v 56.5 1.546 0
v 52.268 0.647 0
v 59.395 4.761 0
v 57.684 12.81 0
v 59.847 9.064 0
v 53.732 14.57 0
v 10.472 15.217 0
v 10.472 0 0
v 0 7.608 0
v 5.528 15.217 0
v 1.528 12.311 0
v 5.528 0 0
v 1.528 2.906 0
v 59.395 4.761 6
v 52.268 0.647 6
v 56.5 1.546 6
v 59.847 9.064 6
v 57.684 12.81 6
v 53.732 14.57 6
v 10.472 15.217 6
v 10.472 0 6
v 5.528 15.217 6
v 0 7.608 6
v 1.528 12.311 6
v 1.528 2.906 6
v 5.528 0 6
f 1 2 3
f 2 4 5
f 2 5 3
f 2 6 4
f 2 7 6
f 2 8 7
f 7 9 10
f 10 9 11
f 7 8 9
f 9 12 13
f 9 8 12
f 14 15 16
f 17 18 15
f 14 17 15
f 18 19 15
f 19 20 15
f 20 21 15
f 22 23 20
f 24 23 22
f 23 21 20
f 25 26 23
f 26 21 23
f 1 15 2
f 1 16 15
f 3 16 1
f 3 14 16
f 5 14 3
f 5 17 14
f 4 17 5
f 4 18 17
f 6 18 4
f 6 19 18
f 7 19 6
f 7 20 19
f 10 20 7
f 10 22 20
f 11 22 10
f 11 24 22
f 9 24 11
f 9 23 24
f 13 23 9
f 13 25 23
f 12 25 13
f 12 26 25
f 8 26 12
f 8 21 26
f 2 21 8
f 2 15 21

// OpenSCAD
$fn = 32;

// ----------------------------------------------------------------------
// Lever arm: two bosses 16 and 14 mm, 45 mm between centres
// ----------------------------------------------------------------------

// --- parameters (mm) ---
profile_height = 6;       // extrusion height
profile_points = 13;      // points of the closed outline

profile = [[0, 7.608], [1.528, 2.906], [5.528, 0], [10.472, 0], [52.268, 0.647], [56.5, 1.546], [59.395, 4.761], [59.847, 9.064], [57.684, 12.81], [53.732, 14.57], [10.472, 15.217], [5.528, 15.217], [1.528, 12.311]];  // single closed polygon, 13 points, counter clockwise

// --- the one profile operation ---
linear_extrude(height = profile_height) polygon(points = profile);
